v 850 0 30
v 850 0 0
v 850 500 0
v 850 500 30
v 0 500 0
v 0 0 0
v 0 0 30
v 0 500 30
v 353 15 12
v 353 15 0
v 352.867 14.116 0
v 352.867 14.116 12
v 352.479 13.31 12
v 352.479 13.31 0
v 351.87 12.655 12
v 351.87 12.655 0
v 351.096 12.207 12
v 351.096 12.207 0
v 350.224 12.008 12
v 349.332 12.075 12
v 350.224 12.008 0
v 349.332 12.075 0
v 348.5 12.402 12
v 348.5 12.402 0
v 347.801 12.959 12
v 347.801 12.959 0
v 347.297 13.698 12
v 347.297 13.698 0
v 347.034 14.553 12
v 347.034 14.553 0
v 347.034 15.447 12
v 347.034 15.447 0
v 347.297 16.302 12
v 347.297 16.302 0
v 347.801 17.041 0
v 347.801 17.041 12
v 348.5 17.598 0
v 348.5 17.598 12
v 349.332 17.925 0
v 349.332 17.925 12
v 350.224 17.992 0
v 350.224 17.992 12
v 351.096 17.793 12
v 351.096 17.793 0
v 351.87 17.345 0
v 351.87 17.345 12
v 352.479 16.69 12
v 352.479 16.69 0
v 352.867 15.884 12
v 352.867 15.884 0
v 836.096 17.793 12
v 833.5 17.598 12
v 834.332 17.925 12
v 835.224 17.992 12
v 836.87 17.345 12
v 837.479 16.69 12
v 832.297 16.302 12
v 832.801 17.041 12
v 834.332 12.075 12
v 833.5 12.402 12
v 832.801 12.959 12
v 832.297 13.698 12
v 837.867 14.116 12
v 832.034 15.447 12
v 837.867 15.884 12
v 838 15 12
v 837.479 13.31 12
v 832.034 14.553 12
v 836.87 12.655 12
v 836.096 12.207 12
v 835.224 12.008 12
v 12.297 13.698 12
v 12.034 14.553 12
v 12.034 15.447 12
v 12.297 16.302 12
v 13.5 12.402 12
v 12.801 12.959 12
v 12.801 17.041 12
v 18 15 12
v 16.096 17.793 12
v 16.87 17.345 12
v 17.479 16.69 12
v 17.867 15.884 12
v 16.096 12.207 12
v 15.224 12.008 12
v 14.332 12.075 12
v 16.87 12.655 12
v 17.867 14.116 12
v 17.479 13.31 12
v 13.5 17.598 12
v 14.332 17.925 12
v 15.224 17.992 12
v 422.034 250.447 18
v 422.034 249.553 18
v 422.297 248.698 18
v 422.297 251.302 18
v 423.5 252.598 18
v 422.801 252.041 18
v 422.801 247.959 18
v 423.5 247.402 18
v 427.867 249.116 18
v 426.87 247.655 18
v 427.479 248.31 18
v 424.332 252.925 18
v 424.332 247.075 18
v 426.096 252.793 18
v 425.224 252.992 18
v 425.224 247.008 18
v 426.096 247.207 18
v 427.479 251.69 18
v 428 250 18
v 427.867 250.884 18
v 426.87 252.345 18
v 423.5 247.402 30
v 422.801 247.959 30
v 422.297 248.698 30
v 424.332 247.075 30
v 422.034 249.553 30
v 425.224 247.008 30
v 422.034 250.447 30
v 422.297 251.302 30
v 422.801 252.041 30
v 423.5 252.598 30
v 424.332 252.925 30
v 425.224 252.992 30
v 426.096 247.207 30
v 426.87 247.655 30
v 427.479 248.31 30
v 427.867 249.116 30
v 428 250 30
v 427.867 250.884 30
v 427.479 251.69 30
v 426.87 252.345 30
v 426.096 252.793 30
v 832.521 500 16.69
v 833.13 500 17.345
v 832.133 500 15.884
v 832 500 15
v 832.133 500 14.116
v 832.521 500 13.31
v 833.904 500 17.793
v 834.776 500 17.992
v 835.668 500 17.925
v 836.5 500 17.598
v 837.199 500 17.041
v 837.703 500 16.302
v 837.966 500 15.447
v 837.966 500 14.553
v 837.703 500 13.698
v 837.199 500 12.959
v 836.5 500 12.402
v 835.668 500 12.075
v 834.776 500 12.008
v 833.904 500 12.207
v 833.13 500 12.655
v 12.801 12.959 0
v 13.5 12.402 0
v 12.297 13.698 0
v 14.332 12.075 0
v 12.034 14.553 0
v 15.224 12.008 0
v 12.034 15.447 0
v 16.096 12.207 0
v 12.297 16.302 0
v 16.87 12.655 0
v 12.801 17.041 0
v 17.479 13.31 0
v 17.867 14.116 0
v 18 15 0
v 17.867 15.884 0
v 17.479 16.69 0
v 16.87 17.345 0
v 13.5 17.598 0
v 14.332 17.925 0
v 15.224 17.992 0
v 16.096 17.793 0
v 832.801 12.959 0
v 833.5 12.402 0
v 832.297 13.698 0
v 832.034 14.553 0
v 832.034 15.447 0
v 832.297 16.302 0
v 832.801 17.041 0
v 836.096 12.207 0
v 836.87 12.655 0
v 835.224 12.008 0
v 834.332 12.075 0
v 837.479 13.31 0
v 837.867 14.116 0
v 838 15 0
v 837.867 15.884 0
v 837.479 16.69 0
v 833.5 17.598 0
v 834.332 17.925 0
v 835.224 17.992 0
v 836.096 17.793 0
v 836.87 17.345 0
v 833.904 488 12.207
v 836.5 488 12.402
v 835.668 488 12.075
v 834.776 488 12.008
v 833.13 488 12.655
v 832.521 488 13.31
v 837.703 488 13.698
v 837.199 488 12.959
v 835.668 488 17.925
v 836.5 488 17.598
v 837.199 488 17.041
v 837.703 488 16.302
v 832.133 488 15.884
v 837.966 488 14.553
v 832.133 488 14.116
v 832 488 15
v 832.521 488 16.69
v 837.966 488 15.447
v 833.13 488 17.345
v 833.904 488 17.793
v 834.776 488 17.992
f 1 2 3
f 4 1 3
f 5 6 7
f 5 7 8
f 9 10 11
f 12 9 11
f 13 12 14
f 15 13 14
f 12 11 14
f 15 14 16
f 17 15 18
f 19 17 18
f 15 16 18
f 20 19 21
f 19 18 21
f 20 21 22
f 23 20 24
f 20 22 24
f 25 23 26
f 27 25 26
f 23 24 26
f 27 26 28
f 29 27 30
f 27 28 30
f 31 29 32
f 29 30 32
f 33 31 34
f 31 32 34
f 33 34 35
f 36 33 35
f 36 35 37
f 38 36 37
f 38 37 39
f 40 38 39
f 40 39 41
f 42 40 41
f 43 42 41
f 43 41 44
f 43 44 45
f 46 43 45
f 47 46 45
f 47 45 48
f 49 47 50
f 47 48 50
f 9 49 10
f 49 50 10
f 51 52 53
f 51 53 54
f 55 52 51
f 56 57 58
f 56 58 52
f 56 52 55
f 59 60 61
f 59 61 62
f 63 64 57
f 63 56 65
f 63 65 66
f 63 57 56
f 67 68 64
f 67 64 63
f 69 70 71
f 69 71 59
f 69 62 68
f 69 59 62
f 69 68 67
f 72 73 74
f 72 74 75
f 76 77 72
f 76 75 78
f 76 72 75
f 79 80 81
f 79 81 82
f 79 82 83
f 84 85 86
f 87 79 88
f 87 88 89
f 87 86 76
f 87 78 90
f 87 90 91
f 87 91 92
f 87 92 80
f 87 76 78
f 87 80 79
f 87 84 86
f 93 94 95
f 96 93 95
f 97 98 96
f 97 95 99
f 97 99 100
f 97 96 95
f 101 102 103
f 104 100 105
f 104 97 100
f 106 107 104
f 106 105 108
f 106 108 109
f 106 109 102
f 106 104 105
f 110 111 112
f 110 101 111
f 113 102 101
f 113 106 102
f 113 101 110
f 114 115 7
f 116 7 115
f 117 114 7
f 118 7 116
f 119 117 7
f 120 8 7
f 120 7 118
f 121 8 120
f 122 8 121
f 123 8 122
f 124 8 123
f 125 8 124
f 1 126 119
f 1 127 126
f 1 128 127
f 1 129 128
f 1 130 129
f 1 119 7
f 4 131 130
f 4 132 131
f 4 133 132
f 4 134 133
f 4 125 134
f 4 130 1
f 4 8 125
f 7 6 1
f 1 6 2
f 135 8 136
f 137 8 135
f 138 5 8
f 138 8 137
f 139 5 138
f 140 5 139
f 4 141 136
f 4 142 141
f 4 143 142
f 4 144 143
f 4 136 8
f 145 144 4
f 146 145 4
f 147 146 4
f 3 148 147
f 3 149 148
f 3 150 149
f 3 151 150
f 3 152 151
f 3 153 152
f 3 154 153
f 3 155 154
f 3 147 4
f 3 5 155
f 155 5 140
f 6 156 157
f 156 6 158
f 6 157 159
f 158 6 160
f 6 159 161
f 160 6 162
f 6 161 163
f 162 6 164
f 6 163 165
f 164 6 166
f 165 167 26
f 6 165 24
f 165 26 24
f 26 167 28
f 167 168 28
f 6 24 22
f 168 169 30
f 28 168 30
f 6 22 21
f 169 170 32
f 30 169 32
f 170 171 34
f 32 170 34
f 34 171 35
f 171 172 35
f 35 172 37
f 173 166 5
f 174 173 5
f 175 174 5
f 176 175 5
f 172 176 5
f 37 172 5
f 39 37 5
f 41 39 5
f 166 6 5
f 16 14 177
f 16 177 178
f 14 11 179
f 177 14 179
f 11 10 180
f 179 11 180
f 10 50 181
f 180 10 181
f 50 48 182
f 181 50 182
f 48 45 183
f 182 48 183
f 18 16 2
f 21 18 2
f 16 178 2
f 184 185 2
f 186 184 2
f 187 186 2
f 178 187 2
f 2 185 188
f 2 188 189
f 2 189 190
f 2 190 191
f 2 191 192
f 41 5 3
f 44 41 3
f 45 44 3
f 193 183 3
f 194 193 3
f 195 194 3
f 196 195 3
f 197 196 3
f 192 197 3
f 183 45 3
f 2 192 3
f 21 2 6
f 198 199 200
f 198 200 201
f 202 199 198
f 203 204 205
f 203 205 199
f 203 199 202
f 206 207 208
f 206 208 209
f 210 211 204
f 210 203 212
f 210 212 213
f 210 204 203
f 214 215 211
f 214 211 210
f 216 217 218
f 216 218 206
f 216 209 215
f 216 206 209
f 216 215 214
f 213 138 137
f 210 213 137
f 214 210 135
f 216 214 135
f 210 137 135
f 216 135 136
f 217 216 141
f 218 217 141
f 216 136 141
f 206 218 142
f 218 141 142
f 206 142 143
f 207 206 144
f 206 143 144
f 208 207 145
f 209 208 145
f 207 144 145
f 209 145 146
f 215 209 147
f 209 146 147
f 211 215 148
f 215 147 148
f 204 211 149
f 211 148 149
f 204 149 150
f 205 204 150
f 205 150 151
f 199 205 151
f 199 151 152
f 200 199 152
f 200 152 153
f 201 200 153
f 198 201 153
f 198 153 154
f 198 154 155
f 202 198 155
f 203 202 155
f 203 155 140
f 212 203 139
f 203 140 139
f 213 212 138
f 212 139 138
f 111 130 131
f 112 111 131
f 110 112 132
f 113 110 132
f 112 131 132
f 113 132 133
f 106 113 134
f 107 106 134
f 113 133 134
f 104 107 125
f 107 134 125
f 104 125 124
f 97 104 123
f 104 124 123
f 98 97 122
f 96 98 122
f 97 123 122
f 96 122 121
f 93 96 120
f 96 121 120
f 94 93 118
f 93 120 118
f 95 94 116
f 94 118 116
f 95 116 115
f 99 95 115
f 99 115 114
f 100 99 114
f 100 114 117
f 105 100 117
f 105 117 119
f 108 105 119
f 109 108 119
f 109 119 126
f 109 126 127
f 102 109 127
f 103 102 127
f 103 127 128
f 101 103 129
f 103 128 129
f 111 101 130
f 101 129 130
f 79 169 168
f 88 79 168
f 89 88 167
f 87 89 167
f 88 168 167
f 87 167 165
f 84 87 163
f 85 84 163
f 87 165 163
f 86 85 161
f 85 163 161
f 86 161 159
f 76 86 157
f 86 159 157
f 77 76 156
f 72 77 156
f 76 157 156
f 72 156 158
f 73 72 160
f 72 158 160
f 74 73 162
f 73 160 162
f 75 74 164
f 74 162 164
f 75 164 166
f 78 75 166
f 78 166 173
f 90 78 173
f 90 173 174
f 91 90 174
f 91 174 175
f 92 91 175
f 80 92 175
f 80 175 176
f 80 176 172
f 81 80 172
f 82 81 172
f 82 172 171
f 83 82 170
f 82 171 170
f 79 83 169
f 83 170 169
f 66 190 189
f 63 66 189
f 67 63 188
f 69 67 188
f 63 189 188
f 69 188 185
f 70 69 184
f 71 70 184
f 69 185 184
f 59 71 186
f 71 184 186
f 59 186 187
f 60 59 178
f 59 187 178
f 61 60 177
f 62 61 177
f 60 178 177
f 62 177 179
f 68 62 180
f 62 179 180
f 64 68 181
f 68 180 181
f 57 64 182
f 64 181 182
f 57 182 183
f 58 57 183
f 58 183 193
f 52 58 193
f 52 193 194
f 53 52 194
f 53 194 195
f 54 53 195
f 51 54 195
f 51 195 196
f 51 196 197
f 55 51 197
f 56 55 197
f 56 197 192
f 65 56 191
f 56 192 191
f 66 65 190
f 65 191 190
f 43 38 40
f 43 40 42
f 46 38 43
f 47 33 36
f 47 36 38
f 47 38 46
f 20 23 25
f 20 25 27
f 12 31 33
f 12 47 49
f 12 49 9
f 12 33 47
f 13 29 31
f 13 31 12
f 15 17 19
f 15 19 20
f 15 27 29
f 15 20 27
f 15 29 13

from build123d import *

# Parameters (mm, degrees)
F0_W      = 850
F0_H      = 500
F1_DEPTH  = 30
F2_R      = 3
F3_DEPTH  = 12
F4_R      = 3
F5_DEPTH  = 12
F6_R      = 3
F7_DEPTH  = 12
F8_R      = 3
F9_DEPTH  = 12
F10_R     = 3
F11_DEPTH = 12


with BuildPart() as f1:
    # F0 (on Top) → F1 (new body)
    with BuildSketch(Plane.XY):
        with Locations((425, 250)):
            Rectangle(F0_W, F0_H)
    extrude(amount=F1_DEPTH)

    # F2 (on face) → F3 (cut)
    with BuildSketch(Plane(origin=(0, 0, 0), x_dir=(1, 0, 0), z_dir=(0, 0, -1))):
        with Locations((835, -15)):
            Circle(F2_R)
    extrude(amount=-F3_DEPTH, mode=Mode.SUBTRACT)

    # F4 (on face) → F5 (cut)
    with BuildSketch(Plane(origin=(0, 0, 0), x_dir=(1, 0, 0), z_dir=(0, 0, -1))):
        with Locations((15, -15)):
            Circle(F4_R)
    extrude(amount=-F5_DEPTH, mode=Mode.SUBTRACT)

    # F6 (on face) → F7 (cut)
    with BuildSketch(Plane(origin=(0, 0, 0), x_dir=(1, 0, 0), z_dir=(0, 0, -1))):
        with Locations((350, -15)):
            Circle(F6_R)
    extrude(amount=-F7_DEPTH, mode=Mode.SUBTRACT)

    # F8 (on face) → F9 (cut)
    with BuildSketch(Plane.XY.offset(30)):
        with Locations((425, 250)):
            Circle(F8_R)
    extrude(amount=-F9_DEPTH, mode=Mode.SUBTRACT)

    # F10 (on face) → F11 (cut)
    with BuildSketch(Plane(origin=(0, 500, 0), x_dir=(-1, 0, 0), z_dir=(0, 1, 0))):
        with Locations((-835, 15)):
            Circle(F10_R)
    extrude(amount=-F11_DEPTH, mode=Mode.SUBTRACT)


solid = f1.part
